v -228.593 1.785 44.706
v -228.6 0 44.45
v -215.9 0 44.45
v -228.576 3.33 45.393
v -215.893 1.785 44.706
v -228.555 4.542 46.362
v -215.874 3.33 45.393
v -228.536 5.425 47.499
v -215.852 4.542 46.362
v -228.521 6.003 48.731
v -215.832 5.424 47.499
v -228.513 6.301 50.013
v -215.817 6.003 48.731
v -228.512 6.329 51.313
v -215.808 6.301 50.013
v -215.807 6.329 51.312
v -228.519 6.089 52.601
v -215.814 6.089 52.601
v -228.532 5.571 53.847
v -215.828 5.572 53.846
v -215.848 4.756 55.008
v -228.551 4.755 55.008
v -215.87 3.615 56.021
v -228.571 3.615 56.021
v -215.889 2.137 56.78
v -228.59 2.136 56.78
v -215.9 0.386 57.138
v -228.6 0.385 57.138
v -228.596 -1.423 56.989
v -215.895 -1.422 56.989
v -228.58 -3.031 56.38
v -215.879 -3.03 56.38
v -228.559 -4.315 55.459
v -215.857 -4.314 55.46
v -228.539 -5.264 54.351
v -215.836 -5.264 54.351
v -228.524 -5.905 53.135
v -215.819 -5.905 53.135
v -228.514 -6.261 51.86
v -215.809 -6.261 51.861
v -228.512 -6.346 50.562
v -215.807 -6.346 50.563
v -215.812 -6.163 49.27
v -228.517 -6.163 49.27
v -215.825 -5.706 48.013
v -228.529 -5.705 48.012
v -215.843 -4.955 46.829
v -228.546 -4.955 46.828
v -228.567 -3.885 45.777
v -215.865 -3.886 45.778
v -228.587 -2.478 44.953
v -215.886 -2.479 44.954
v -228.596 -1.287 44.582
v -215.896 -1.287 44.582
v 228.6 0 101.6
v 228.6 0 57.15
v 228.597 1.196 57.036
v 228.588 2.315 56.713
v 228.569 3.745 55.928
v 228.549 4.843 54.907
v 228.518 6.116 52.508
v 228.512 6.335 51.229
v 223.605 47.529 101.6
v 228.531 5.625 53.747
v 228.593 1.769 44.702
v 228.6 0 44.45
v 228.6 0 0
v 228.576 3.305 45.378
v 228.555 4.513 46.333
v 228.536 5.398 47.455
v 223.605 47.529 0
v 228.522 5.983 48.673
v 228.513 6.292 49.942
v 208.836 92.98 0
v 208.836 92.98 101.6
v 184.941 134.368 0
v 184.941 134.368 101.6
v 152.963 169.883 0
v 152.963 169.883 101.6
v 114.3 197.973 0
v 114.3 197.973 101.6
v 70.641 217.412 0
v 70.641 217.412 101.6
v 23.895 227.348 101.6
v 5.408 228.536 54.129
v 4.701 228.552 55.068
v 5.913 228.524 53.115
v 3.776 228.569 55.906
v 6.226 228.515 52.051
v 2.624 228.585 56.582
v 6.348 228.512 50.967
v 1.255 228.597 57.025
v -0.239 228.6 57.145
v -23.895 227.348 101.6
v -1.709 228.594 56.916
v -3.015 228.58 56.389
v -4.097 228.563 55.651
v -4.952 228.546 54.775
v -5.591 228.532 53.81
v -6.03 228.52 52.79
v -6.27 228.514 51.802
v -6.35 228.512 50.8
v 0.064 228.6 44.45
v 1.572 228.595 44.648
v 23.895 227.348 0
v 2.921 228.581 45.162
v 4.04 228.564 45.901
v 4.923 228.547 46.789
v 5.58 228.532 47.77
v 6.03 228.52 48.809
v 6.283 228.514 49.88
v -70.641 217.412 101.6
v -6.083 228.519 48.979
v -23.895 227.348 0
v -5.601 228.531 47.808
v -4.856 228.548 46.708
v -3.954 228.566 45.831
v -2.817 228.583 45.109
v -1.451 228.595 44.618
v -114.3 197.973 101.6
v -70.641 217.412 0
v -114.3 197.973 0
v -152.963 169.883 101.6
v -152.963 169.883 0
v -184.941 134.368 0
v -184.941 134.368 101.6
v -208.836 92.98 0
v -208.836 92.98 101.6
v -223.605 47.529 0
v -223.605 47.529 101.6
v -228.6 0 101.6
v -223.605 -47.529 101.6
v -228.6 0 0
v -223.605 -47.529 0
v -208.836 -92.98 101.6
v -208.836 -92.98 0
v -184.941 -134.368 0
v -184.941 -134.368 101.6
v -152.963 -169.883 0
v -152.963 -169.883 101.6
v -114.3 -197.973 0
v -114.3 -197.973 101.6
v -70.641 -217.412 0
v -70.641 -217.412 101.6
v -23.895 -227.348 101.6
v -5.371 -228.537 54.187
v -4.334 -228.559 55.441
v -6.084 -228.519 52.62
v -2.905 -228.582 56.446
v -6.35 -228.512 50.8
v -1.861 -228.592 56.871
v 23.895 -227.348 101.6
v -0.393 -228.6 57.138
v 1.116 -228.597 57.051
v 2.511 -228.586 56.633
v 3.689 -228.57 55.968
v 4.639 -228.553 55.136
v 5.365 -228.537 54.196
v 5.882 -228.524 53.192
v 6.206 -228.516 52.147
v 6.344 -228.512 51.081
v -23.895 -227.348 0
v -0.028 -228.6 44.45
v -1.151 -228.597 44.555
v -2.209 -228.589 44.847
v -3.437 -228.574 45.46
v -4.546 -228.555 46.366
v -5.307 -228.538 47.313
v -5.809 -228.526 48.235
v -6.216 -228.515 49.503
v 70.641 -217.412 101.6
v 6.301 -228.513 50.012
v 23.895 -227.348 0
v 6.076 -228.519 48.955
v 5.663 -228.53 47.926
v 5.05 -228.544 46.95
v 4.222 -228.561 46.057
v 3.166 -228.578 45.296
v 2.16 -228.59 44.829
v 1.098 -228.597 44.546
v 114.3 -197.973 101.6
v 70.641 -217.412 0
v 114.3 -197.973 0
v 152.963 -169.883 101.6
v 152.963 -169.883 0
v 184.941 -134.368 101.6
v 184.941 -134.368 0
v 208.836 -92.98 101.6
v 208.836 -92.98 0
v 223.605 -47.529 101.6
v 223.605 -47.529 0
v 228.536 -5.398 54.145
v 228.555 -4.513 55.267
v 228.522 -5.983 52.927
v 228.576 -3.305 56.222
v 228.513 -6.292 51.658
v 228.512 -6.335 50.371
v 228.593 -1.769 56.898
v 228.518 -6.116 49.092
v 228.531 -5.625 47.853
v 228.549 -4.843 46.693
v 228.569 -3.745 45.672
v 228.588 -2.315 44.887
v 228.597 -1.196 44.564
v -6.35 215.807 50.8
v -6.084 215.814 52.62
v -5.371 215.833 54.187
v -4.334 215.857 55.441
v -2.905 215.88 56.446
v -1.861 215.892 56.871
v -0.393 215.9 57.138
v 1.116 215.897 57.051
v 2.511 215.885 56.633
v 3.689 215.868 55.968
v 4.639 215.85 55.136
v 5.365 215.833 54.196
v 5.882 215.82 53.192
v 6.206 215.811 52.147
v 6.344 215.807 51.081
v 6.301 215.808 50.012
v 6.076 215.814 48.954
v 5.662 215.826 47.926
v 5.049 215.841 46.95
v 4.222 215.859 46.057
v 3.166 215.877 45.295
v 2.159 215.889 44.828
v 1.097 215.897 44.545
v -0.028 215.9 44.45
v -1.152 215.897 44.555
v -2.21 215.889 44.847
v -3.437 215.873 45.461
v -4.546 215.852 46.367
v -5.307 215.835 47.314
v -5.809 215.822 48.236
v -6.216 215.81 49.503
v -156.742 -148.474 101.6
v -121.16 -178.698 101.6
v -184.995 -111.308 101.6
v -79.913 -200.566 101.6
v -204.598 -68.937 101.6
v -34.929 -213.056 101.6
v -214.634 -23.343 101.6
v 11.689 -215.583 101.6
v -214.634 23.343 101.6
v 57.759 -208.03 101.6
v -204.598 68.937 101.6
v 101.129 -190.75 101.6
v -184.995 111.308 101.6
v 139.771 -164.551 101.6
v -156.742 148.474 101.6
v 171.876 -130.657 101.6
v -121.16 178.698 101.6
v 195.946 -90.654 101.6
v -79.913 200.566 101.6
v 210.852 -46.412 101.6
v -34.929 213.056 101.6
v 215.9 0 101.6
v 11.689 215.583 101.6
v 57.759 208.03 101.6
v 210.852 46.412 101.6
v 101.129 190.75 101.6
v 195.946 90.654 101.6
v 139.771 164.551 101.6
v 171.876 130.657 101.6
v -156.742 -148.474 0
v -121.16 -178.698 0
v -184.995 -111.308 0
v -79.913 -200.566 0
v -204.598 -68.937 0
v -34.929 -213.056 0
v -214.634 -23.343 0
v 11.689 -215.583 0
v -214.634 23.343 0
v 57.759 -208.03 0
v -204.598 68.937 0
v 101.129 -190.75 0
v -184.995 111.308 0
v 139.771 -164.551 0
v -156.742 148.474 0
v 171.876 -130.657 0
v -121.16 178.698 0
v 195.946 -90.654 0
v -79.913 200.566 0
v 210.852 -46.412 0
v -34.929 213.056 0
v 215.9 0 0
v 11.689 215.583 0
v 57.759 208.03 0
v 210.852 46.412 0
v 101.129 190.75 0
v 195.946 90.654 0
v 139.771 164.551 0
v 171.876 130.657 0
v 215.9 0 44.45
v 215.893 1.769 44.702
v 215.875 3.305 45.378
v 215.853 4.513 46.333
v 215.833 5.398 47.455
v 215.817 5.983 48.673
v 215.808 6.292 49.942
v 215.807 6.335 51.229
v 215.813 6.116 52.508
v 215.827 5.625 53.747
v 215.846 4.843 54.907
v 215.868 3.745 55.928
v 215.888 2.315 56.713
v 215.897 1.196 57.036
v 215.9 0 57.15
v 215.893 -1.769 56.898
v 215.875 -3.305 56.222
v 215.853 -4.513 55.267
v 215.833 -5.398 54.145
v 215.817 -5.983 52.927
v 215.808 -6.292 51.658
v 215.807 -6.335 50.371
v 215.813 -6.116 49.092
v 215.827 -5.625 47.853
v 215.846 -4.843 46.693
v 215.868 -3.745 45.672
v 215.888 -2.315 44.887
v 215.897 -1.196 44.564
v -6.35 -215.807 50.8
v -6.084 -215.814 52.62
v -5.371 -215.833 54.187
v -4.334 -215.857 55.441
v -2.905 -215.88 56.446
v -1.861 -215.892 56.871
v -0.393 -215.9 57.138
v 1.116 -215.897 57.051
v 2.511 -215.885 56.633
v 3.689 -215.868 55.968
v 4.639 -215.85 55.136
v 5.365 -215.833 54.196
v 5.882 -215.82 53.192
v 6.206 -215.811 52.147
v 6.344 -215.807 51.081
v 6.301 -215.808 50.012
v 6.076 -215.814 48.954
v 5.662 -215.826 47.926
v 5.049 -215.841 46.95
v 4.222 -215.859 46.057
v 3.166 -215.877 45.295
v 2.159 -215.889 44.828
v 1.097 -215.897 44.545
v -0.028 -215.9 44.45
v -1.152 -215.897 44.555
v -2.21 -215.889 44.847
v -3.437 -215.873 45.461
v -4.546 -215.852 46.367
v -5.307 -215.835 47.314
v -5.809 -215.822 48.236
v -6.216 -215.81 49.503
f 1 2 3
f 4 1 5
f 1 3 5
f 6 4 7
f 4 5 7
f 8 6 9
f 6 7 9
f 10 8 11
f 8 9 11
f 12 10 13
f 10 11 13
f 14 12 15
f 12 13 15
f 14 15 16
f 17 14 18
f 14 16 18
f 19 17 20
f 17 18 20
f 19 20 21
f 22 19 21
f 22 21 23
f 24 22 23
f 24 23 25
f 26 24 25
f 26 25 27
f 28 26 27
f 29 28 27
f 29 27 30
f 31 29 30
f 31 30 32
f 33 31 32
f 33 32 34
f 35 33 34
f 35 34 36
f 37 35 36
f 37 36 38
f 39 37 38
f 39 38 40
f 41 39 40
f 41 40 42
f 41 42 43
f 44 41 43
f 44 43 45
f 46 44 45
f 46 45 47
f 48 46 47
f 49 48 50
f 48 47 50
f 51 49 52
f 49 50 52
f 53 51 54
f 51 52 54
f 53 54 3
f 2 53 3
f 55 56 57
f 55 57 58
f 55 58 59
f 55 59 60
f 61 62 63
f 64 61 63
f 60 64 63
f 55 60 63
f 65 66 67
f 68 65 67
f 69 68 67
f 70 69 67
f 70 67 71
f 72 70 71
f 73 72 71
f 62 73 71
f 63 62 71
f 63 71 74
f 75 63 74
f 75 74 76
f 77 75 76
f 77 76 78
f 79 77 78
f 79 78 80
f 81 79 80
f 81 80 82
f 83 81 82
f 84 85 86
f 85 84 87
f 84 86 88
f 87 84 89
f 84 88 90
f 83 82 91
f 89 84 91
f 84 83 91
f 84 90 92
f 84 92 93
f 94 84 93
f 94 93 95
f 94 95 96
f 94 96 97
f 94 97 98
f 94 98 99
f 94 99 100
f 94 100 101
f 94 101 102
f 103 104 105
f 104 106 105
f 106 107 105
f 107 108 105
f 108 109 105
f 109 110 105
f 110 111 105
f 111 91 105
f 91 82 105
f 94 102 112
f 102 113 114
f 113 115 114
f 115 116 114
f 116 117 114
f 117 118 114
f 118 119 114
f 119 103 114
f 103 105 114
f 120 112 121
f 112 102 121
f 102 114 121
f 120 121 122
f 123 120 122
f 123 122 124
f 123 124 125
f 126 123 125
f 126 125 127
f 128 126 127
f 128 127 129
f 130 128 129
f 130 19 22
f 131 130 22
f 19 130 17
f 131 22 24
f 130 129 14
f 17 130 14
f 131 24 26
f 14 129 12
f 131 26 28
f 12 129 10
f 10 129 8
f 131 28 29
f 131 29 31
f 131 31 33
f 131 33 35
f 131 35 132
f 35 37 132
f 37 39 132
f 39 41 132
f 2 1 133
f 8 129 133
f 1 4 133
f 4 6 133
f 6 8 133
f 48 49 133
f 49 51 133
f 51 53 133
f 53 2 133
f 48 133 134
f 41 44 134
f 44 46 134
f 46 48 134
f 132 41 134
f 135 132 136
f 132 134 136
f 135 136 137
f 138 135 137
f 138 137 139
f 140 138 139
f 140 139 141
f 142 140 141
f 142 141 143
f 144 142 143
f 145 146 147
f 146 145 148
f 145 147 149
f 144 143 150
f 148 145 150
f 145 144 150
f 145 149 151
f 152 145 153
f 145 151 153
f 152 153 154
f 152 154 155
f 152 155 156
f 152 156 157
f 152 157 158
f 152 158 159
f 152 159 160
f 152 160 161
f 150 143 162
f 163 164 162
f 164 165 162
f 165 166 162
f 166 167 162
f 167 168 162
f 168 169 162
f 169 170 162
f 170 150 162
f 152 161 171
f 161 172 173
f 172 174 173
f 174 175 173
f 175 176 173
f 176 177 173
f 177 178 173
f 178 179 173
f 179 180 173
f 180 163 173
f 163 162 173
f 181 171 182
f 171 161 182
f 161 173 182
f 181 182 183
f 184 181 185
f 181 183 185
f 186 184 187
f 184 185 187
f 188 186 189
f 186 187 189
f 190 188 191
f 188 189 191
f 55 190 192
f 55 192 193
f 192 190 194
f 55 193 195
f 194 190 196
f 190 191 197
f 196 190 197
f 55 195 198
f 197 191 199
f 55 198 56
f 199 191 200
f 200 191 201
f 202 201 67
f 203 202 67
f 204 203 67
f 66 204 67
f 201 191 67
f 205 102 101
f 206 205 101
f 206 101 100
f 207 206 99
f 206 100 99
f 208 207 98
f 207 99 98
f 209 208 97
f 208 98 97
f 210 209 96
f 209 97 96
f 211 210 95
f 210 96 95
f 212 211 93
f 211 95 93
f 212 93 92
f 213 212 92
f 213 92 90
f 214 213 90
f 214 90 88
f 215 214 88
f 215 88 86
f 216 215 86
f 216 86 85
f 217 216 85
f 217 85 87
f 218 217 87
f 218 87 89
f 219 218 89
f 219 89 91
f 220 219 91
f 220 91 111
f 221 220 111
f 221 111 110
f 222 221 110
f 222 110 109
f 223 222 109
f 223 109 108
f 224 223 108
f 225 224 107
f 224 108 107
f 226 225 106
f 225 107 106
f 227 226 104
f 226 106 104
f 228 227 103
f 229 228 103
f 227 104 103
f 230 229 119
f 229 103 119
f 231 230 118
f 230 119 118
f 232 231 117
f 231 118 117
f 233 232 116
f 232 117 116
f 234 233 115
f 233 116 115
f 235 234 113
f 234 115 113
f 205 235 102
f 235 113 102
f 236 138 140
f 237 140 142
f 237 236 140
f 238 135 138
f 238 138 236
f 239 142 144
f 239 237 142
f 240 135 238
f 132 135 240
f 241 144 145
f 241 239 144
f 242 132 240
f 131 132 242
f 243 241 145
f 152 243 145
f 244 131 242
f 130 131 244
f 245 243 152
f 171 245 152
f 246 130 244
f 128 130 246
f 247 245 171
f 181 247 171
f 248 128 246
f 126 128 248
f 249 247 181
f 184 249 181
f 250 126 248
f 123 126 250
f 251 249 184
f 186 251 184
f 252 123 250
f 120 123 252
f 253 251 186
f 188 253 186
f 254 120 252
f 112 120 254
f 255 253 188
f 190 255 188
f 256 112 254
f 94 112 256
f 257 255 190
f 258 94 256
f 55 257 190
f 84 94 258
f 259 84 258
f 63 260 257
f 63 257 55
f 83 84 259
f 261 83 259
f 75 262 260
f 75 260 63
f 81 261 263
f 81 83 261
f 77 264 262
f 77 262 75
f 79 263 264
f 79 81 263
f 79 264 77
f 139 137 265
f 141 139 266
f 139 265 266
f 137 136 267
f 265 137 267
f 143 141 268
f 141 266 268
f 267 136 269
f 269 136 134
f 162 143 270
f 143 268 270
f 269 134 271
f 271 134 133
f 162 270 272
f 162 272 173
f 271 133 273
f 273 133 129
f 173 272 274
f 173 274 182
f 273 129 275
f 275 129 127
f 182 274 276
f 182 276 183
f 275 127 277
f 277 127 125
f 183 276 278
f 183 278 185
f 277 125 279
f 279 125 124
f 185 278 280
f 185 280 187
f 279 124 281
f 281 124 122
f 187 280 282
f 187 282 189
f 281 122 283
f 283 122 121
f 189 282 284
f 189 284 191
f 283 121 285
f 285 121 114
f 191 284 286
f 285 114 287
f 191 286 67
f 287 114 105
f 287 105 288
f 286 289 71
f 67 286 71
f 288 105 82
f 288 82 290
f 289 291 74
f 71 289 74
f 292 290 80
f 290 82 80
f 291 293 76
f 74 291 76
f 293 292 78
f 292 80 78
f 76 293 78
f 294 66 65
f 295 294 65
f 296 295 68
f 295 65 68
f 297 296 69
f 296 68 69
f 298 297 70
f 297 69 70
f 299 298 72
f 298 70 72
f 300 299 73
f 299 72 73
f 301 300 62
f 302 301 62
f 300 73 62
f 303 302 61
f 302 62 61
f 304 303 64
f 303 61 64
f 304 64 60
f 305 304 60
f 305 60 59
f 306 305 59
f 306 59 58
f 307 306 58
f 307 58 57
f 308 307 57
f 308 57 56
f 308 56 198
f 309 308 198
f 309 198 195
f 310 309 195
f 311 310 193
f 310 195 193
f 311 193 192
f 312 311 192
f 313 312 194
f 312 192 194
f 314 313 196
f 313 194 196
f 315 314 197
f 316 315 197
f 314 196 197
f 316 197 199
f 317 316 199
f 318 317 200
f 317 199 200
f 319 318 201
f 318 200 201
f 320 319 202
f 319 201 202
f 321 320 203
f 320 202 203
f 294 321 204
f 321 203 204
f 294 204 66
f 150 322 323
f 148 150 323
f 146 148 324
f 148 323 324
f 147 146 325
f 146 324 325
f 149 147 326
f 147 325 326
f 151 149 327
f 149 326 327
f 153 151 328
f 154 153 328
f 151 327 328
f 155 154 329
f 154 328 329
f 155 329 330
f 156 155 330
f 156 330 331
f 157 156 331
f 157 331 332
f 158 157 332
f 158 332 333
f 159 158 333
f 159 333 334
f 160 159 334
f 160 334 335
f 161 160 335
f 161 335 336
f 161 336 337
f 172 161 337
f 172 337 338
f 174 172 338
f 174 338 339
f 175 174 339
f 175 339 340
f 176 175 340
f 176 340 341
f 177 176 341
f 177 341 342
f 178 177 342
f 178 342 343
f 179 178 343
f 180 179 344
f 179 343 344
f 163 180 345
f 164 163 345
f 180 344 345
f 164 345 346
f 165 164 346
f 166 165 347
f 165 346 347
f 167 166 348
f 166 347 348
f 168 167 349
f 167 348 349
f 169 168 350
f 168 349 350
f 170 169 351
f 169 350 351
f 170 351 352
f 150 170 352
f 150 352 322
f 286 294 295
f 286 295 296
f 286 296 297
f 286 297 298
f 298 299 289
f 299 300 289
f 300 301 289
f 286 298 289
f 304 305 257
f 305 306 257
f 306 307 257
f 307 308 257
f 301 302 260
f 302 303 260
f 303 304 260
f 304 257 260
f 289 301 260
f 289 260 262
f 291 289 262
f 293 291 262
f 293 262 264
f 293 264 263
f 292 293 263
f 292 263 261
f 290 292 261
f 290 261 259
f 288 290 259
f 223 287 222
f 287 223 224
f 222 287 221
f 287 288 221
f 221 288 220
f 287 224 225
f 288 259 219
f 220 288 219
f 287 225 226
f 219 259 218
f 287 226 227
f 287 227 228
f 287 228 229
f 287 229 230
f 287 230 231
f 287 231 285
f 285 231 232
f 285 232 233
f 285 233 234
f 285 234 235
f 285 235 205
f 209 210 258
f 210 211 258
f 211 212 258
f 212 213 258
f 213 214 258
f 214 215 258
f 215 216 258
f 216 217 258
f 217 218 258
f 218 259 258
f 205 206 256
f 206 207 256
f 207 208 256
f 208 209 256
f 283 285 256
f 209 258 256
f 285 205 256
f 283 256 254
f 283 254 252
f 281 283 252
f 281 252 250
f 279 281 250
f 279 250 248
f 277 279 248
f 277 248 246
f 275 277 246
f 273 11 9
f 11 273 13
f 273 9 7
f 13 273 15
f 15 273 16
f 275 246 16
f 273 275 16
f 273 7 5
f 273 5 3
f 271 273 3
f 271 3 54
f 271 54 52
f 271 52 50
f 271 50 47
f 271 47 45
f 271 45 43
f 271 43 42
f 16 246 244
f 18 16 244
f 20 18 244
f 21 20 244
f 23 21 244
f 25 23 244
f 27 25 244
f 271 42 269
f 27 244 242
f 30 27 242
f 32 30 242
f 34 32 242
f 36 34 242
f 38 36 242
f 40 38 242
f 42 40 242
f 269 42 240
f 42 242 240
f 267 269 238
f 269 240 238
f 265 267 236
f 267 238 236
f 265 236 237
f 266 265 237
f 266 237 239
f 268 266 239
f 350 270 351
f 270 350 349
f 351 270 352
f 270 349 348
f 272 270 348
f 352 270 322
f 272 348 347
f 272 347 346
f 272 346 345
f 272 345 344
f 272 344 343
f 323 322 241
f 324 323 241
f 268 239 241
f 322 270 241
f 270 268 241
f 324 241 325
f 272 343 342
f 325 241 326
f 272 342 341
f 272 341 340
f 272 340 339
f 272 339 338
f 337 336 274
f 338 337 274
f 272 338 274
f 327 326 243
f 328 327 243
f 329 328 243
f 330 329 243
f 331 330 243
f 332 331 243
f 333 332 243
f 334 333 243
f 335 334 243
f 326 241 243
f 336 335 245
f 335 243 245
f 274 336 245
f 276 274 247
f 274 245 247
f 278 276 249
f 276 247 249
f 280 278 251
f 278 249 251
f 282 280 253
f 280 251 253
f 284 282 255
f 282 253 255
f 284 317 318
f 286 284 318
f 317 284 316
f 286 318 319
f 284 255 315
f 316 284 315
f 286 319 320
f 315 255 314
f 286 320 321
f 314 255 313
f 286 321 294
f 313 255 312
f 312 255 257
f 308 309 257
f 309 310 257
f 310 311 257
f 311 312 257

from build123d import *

# Parameters (mm, degrees)
SKETCH1_R           = 228.6
BOSS_EXTRUDE1_DEPTH = 101.6
SKETCH2_R           = 215.9
CUT_EXTRUDE1_DEPTH  = 102.6
SKETCH3_R           = 6.35
CUT_EXTRUDE2_DEPTH  = 458.2
SKETCH4_R           = 6.35
CUT_EXTRUDE3_DEPTH  = 458.2000001


with BuildPart() as part:
    # Sketch1 → Boss-Extrude1 (new body)
    with BuildSketch(Plane.XY):
        Circle(SKETCH1_R)
    extrude(amount=BOSS_EXTRUDE1_DEPTH)

    # Sketch2 → Cut-Extrude1 (cut, through all)
    with BuildSketch(Plane.XY.offset(101.6)):
        Circle(SKETCH2_R)
    extrude(amount=-CUT_EXTRUDE1_DEPTH, mode=Mode.SUBTRACT)

    # Sketch3 → Cut-Extrude2 (cut, through all)
    with BuildSketch(Plane(origin=(0, 228.6, 0), x_dir=(-1, 0, 0), z_dir=(0, 1, 0))):
        with Locations((0, 50.8)):
            Circle(SKETCH3_R)
    extrude(amount=-CUT_EXTRUDE2_DEPTH, mode=Mode.SUBTRACT)

    # Sketch4 → Cut-Extrude3 (cut, through all)
    with BuildSketch(Plane(origin=(228.6, 0, 0), x_dir=(0, 0, -1), z_dir=(1, 0, 0))):
        with Locations((-50.8, 0)):
            Circle(SKETCH4_R)
    extrude(amount=-CUT_EXTRUDE3_DEPTH, mode=Mode.SUBTRACT)


solid = part.part
